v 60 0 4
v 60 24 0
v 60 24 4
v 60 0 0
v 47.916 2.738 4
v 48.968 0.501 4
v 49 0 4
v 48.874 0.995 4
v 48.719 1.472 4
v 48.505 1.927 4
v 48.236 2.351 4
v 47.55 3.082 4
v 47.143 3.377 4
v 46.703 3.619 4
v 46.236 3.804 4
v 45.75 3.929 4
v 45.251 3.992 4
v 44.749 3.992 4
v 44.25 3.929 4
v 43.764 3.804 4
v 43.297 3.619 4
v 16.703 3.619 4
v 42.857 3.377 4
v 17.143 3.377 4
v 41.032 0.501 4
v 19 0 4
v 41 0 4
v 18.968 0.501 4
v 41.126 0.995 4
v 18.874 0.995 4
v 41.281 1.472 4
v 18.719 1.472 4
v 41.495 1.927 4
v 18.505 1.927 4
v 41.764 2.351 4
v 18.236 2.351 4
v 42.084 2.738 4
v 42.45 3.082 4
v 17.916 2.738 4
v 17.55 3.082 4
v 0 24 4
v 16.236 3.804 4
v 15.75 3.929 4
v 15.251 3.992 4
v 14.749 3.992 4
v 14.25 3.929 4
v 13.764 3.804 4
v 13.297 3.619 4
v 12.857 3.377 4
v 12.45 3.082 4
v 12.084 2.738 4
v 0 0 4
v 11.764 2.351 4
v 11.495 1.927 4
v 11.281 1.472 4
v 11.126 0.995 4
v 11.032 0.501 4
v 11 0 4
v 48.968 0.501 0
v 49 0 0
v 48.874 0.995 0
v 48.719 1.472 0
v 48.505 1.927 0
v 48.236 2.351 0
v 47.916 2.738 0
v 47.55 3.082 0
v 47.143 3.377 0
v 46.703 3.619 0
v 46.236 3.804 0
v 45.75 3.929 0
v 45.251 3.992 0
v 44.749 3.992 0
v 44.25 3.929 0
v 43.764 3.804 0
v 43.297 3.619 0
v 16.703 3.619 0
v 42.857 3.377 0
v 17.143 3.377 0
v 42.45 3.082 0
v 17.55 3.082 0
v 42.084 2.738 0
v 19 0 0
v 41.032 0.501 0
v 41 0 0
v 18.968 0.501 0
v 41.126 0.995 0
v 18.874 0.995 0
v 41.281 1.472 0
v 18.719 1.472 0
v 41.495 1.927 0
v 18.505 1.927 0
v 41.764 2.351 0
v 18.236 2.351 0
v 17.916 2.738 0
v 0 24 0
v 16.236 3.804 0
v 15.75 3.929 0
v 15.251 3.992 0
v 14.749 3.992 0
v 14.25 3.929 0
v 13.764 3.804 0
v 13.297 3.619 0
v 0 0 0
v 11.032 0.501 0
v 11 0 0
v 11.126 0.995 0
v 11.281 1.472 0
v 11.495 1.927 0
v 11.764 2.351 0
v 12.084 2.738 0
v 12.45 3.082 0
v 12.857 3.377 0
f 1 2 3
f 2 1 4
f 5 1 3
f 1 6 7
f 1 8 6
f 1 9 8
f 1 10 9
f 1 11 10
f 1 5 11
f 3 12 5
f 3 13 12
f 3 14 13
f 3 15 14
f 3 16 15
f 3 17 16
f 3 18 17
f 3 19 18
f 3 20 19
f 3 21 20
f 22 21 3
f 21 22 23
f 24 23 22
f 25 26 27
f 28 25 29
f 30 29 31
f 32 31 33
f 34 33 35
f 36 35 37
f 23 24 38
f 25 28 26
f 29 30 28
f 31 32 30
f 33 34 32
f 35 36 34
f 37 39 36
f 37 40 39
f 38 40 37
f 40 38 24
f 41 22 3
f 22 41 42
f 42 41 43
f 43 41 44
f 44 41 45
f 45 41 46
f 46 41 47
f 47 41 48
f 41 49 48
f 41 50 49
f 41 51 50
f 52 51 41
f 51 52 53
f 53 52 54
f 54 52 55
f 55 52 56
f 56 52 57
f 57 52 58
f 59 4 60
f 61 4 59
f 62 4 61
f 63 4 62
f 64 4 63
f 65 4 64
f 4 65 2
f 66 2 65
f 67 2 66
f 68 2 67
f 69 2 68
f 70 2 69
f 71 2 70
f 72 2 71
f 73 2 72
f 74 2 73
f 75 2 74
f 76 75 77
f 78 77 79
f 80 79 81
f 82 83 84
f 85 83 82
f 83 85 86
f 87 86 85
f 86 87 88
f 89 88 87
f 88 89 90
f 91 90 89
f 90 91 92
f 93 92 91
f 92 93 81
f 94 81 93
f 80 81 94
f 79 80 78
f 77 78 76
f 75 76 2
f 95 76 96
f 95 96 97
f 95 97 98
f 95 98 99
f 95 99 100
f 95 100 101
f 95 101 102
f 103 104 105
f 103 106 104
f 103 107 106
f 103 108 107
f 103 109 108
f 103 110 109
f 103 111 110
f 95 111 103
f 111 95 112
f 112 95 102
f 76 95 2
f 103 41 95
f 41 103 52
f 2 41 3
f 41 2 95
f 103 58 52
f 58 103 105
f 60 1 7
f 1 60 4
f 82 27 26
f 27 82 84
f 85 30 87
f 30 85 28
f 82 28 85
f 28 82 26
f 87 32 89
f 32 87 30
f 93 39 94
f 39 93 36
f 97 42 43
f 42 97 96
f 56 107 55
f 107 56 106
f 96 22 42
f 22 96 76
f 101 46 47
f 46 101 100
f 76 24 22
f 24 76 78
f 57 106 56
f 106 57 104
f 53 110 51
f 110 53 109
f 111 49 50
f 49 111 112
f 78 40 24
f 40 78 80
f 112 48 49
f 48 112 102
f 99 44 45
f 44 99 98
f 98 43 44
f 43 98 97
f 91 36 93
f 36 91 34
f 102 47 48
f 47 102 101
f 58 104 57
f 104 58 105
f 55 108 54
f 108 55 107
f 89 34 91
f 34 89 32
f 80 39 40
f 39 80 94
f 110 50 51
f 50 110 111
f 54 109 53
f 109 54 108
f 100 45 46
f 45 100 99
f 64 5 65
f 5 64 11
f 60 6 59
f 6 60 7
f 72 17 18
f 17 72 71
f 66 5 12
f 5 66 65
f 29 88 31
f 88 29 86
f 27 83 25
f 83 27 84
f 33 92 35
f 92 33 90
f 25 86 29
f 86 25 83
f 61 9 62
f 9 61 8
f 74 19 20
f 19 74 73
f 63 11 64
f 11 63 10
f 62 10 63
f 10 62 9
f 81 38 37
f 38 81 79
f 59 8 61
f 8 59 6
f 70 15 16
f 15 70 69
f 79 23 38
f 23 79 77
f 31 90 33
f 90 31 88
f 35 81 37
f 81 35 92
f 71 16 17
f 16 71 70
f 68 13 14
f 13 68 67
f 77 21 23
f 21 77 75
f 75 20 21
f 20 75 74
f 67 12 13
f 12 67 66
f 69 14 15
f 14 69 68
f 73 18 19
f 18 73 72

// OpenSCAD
module rectangular_plate(width, height, depth, center_x, center_y, center_z) {
  difference() {
    cube([width, height, depth]);
    translate([center_x, center_y, center_z])
    cylinder(h=depth, r=4, $fn=50);
    translate([width - center_x, center_y, center_z])
    cylinder(h=depth, r=4, $fn=50);
  }
}

rectangular_plate(60, 24, 4, 15, 0, 0);
